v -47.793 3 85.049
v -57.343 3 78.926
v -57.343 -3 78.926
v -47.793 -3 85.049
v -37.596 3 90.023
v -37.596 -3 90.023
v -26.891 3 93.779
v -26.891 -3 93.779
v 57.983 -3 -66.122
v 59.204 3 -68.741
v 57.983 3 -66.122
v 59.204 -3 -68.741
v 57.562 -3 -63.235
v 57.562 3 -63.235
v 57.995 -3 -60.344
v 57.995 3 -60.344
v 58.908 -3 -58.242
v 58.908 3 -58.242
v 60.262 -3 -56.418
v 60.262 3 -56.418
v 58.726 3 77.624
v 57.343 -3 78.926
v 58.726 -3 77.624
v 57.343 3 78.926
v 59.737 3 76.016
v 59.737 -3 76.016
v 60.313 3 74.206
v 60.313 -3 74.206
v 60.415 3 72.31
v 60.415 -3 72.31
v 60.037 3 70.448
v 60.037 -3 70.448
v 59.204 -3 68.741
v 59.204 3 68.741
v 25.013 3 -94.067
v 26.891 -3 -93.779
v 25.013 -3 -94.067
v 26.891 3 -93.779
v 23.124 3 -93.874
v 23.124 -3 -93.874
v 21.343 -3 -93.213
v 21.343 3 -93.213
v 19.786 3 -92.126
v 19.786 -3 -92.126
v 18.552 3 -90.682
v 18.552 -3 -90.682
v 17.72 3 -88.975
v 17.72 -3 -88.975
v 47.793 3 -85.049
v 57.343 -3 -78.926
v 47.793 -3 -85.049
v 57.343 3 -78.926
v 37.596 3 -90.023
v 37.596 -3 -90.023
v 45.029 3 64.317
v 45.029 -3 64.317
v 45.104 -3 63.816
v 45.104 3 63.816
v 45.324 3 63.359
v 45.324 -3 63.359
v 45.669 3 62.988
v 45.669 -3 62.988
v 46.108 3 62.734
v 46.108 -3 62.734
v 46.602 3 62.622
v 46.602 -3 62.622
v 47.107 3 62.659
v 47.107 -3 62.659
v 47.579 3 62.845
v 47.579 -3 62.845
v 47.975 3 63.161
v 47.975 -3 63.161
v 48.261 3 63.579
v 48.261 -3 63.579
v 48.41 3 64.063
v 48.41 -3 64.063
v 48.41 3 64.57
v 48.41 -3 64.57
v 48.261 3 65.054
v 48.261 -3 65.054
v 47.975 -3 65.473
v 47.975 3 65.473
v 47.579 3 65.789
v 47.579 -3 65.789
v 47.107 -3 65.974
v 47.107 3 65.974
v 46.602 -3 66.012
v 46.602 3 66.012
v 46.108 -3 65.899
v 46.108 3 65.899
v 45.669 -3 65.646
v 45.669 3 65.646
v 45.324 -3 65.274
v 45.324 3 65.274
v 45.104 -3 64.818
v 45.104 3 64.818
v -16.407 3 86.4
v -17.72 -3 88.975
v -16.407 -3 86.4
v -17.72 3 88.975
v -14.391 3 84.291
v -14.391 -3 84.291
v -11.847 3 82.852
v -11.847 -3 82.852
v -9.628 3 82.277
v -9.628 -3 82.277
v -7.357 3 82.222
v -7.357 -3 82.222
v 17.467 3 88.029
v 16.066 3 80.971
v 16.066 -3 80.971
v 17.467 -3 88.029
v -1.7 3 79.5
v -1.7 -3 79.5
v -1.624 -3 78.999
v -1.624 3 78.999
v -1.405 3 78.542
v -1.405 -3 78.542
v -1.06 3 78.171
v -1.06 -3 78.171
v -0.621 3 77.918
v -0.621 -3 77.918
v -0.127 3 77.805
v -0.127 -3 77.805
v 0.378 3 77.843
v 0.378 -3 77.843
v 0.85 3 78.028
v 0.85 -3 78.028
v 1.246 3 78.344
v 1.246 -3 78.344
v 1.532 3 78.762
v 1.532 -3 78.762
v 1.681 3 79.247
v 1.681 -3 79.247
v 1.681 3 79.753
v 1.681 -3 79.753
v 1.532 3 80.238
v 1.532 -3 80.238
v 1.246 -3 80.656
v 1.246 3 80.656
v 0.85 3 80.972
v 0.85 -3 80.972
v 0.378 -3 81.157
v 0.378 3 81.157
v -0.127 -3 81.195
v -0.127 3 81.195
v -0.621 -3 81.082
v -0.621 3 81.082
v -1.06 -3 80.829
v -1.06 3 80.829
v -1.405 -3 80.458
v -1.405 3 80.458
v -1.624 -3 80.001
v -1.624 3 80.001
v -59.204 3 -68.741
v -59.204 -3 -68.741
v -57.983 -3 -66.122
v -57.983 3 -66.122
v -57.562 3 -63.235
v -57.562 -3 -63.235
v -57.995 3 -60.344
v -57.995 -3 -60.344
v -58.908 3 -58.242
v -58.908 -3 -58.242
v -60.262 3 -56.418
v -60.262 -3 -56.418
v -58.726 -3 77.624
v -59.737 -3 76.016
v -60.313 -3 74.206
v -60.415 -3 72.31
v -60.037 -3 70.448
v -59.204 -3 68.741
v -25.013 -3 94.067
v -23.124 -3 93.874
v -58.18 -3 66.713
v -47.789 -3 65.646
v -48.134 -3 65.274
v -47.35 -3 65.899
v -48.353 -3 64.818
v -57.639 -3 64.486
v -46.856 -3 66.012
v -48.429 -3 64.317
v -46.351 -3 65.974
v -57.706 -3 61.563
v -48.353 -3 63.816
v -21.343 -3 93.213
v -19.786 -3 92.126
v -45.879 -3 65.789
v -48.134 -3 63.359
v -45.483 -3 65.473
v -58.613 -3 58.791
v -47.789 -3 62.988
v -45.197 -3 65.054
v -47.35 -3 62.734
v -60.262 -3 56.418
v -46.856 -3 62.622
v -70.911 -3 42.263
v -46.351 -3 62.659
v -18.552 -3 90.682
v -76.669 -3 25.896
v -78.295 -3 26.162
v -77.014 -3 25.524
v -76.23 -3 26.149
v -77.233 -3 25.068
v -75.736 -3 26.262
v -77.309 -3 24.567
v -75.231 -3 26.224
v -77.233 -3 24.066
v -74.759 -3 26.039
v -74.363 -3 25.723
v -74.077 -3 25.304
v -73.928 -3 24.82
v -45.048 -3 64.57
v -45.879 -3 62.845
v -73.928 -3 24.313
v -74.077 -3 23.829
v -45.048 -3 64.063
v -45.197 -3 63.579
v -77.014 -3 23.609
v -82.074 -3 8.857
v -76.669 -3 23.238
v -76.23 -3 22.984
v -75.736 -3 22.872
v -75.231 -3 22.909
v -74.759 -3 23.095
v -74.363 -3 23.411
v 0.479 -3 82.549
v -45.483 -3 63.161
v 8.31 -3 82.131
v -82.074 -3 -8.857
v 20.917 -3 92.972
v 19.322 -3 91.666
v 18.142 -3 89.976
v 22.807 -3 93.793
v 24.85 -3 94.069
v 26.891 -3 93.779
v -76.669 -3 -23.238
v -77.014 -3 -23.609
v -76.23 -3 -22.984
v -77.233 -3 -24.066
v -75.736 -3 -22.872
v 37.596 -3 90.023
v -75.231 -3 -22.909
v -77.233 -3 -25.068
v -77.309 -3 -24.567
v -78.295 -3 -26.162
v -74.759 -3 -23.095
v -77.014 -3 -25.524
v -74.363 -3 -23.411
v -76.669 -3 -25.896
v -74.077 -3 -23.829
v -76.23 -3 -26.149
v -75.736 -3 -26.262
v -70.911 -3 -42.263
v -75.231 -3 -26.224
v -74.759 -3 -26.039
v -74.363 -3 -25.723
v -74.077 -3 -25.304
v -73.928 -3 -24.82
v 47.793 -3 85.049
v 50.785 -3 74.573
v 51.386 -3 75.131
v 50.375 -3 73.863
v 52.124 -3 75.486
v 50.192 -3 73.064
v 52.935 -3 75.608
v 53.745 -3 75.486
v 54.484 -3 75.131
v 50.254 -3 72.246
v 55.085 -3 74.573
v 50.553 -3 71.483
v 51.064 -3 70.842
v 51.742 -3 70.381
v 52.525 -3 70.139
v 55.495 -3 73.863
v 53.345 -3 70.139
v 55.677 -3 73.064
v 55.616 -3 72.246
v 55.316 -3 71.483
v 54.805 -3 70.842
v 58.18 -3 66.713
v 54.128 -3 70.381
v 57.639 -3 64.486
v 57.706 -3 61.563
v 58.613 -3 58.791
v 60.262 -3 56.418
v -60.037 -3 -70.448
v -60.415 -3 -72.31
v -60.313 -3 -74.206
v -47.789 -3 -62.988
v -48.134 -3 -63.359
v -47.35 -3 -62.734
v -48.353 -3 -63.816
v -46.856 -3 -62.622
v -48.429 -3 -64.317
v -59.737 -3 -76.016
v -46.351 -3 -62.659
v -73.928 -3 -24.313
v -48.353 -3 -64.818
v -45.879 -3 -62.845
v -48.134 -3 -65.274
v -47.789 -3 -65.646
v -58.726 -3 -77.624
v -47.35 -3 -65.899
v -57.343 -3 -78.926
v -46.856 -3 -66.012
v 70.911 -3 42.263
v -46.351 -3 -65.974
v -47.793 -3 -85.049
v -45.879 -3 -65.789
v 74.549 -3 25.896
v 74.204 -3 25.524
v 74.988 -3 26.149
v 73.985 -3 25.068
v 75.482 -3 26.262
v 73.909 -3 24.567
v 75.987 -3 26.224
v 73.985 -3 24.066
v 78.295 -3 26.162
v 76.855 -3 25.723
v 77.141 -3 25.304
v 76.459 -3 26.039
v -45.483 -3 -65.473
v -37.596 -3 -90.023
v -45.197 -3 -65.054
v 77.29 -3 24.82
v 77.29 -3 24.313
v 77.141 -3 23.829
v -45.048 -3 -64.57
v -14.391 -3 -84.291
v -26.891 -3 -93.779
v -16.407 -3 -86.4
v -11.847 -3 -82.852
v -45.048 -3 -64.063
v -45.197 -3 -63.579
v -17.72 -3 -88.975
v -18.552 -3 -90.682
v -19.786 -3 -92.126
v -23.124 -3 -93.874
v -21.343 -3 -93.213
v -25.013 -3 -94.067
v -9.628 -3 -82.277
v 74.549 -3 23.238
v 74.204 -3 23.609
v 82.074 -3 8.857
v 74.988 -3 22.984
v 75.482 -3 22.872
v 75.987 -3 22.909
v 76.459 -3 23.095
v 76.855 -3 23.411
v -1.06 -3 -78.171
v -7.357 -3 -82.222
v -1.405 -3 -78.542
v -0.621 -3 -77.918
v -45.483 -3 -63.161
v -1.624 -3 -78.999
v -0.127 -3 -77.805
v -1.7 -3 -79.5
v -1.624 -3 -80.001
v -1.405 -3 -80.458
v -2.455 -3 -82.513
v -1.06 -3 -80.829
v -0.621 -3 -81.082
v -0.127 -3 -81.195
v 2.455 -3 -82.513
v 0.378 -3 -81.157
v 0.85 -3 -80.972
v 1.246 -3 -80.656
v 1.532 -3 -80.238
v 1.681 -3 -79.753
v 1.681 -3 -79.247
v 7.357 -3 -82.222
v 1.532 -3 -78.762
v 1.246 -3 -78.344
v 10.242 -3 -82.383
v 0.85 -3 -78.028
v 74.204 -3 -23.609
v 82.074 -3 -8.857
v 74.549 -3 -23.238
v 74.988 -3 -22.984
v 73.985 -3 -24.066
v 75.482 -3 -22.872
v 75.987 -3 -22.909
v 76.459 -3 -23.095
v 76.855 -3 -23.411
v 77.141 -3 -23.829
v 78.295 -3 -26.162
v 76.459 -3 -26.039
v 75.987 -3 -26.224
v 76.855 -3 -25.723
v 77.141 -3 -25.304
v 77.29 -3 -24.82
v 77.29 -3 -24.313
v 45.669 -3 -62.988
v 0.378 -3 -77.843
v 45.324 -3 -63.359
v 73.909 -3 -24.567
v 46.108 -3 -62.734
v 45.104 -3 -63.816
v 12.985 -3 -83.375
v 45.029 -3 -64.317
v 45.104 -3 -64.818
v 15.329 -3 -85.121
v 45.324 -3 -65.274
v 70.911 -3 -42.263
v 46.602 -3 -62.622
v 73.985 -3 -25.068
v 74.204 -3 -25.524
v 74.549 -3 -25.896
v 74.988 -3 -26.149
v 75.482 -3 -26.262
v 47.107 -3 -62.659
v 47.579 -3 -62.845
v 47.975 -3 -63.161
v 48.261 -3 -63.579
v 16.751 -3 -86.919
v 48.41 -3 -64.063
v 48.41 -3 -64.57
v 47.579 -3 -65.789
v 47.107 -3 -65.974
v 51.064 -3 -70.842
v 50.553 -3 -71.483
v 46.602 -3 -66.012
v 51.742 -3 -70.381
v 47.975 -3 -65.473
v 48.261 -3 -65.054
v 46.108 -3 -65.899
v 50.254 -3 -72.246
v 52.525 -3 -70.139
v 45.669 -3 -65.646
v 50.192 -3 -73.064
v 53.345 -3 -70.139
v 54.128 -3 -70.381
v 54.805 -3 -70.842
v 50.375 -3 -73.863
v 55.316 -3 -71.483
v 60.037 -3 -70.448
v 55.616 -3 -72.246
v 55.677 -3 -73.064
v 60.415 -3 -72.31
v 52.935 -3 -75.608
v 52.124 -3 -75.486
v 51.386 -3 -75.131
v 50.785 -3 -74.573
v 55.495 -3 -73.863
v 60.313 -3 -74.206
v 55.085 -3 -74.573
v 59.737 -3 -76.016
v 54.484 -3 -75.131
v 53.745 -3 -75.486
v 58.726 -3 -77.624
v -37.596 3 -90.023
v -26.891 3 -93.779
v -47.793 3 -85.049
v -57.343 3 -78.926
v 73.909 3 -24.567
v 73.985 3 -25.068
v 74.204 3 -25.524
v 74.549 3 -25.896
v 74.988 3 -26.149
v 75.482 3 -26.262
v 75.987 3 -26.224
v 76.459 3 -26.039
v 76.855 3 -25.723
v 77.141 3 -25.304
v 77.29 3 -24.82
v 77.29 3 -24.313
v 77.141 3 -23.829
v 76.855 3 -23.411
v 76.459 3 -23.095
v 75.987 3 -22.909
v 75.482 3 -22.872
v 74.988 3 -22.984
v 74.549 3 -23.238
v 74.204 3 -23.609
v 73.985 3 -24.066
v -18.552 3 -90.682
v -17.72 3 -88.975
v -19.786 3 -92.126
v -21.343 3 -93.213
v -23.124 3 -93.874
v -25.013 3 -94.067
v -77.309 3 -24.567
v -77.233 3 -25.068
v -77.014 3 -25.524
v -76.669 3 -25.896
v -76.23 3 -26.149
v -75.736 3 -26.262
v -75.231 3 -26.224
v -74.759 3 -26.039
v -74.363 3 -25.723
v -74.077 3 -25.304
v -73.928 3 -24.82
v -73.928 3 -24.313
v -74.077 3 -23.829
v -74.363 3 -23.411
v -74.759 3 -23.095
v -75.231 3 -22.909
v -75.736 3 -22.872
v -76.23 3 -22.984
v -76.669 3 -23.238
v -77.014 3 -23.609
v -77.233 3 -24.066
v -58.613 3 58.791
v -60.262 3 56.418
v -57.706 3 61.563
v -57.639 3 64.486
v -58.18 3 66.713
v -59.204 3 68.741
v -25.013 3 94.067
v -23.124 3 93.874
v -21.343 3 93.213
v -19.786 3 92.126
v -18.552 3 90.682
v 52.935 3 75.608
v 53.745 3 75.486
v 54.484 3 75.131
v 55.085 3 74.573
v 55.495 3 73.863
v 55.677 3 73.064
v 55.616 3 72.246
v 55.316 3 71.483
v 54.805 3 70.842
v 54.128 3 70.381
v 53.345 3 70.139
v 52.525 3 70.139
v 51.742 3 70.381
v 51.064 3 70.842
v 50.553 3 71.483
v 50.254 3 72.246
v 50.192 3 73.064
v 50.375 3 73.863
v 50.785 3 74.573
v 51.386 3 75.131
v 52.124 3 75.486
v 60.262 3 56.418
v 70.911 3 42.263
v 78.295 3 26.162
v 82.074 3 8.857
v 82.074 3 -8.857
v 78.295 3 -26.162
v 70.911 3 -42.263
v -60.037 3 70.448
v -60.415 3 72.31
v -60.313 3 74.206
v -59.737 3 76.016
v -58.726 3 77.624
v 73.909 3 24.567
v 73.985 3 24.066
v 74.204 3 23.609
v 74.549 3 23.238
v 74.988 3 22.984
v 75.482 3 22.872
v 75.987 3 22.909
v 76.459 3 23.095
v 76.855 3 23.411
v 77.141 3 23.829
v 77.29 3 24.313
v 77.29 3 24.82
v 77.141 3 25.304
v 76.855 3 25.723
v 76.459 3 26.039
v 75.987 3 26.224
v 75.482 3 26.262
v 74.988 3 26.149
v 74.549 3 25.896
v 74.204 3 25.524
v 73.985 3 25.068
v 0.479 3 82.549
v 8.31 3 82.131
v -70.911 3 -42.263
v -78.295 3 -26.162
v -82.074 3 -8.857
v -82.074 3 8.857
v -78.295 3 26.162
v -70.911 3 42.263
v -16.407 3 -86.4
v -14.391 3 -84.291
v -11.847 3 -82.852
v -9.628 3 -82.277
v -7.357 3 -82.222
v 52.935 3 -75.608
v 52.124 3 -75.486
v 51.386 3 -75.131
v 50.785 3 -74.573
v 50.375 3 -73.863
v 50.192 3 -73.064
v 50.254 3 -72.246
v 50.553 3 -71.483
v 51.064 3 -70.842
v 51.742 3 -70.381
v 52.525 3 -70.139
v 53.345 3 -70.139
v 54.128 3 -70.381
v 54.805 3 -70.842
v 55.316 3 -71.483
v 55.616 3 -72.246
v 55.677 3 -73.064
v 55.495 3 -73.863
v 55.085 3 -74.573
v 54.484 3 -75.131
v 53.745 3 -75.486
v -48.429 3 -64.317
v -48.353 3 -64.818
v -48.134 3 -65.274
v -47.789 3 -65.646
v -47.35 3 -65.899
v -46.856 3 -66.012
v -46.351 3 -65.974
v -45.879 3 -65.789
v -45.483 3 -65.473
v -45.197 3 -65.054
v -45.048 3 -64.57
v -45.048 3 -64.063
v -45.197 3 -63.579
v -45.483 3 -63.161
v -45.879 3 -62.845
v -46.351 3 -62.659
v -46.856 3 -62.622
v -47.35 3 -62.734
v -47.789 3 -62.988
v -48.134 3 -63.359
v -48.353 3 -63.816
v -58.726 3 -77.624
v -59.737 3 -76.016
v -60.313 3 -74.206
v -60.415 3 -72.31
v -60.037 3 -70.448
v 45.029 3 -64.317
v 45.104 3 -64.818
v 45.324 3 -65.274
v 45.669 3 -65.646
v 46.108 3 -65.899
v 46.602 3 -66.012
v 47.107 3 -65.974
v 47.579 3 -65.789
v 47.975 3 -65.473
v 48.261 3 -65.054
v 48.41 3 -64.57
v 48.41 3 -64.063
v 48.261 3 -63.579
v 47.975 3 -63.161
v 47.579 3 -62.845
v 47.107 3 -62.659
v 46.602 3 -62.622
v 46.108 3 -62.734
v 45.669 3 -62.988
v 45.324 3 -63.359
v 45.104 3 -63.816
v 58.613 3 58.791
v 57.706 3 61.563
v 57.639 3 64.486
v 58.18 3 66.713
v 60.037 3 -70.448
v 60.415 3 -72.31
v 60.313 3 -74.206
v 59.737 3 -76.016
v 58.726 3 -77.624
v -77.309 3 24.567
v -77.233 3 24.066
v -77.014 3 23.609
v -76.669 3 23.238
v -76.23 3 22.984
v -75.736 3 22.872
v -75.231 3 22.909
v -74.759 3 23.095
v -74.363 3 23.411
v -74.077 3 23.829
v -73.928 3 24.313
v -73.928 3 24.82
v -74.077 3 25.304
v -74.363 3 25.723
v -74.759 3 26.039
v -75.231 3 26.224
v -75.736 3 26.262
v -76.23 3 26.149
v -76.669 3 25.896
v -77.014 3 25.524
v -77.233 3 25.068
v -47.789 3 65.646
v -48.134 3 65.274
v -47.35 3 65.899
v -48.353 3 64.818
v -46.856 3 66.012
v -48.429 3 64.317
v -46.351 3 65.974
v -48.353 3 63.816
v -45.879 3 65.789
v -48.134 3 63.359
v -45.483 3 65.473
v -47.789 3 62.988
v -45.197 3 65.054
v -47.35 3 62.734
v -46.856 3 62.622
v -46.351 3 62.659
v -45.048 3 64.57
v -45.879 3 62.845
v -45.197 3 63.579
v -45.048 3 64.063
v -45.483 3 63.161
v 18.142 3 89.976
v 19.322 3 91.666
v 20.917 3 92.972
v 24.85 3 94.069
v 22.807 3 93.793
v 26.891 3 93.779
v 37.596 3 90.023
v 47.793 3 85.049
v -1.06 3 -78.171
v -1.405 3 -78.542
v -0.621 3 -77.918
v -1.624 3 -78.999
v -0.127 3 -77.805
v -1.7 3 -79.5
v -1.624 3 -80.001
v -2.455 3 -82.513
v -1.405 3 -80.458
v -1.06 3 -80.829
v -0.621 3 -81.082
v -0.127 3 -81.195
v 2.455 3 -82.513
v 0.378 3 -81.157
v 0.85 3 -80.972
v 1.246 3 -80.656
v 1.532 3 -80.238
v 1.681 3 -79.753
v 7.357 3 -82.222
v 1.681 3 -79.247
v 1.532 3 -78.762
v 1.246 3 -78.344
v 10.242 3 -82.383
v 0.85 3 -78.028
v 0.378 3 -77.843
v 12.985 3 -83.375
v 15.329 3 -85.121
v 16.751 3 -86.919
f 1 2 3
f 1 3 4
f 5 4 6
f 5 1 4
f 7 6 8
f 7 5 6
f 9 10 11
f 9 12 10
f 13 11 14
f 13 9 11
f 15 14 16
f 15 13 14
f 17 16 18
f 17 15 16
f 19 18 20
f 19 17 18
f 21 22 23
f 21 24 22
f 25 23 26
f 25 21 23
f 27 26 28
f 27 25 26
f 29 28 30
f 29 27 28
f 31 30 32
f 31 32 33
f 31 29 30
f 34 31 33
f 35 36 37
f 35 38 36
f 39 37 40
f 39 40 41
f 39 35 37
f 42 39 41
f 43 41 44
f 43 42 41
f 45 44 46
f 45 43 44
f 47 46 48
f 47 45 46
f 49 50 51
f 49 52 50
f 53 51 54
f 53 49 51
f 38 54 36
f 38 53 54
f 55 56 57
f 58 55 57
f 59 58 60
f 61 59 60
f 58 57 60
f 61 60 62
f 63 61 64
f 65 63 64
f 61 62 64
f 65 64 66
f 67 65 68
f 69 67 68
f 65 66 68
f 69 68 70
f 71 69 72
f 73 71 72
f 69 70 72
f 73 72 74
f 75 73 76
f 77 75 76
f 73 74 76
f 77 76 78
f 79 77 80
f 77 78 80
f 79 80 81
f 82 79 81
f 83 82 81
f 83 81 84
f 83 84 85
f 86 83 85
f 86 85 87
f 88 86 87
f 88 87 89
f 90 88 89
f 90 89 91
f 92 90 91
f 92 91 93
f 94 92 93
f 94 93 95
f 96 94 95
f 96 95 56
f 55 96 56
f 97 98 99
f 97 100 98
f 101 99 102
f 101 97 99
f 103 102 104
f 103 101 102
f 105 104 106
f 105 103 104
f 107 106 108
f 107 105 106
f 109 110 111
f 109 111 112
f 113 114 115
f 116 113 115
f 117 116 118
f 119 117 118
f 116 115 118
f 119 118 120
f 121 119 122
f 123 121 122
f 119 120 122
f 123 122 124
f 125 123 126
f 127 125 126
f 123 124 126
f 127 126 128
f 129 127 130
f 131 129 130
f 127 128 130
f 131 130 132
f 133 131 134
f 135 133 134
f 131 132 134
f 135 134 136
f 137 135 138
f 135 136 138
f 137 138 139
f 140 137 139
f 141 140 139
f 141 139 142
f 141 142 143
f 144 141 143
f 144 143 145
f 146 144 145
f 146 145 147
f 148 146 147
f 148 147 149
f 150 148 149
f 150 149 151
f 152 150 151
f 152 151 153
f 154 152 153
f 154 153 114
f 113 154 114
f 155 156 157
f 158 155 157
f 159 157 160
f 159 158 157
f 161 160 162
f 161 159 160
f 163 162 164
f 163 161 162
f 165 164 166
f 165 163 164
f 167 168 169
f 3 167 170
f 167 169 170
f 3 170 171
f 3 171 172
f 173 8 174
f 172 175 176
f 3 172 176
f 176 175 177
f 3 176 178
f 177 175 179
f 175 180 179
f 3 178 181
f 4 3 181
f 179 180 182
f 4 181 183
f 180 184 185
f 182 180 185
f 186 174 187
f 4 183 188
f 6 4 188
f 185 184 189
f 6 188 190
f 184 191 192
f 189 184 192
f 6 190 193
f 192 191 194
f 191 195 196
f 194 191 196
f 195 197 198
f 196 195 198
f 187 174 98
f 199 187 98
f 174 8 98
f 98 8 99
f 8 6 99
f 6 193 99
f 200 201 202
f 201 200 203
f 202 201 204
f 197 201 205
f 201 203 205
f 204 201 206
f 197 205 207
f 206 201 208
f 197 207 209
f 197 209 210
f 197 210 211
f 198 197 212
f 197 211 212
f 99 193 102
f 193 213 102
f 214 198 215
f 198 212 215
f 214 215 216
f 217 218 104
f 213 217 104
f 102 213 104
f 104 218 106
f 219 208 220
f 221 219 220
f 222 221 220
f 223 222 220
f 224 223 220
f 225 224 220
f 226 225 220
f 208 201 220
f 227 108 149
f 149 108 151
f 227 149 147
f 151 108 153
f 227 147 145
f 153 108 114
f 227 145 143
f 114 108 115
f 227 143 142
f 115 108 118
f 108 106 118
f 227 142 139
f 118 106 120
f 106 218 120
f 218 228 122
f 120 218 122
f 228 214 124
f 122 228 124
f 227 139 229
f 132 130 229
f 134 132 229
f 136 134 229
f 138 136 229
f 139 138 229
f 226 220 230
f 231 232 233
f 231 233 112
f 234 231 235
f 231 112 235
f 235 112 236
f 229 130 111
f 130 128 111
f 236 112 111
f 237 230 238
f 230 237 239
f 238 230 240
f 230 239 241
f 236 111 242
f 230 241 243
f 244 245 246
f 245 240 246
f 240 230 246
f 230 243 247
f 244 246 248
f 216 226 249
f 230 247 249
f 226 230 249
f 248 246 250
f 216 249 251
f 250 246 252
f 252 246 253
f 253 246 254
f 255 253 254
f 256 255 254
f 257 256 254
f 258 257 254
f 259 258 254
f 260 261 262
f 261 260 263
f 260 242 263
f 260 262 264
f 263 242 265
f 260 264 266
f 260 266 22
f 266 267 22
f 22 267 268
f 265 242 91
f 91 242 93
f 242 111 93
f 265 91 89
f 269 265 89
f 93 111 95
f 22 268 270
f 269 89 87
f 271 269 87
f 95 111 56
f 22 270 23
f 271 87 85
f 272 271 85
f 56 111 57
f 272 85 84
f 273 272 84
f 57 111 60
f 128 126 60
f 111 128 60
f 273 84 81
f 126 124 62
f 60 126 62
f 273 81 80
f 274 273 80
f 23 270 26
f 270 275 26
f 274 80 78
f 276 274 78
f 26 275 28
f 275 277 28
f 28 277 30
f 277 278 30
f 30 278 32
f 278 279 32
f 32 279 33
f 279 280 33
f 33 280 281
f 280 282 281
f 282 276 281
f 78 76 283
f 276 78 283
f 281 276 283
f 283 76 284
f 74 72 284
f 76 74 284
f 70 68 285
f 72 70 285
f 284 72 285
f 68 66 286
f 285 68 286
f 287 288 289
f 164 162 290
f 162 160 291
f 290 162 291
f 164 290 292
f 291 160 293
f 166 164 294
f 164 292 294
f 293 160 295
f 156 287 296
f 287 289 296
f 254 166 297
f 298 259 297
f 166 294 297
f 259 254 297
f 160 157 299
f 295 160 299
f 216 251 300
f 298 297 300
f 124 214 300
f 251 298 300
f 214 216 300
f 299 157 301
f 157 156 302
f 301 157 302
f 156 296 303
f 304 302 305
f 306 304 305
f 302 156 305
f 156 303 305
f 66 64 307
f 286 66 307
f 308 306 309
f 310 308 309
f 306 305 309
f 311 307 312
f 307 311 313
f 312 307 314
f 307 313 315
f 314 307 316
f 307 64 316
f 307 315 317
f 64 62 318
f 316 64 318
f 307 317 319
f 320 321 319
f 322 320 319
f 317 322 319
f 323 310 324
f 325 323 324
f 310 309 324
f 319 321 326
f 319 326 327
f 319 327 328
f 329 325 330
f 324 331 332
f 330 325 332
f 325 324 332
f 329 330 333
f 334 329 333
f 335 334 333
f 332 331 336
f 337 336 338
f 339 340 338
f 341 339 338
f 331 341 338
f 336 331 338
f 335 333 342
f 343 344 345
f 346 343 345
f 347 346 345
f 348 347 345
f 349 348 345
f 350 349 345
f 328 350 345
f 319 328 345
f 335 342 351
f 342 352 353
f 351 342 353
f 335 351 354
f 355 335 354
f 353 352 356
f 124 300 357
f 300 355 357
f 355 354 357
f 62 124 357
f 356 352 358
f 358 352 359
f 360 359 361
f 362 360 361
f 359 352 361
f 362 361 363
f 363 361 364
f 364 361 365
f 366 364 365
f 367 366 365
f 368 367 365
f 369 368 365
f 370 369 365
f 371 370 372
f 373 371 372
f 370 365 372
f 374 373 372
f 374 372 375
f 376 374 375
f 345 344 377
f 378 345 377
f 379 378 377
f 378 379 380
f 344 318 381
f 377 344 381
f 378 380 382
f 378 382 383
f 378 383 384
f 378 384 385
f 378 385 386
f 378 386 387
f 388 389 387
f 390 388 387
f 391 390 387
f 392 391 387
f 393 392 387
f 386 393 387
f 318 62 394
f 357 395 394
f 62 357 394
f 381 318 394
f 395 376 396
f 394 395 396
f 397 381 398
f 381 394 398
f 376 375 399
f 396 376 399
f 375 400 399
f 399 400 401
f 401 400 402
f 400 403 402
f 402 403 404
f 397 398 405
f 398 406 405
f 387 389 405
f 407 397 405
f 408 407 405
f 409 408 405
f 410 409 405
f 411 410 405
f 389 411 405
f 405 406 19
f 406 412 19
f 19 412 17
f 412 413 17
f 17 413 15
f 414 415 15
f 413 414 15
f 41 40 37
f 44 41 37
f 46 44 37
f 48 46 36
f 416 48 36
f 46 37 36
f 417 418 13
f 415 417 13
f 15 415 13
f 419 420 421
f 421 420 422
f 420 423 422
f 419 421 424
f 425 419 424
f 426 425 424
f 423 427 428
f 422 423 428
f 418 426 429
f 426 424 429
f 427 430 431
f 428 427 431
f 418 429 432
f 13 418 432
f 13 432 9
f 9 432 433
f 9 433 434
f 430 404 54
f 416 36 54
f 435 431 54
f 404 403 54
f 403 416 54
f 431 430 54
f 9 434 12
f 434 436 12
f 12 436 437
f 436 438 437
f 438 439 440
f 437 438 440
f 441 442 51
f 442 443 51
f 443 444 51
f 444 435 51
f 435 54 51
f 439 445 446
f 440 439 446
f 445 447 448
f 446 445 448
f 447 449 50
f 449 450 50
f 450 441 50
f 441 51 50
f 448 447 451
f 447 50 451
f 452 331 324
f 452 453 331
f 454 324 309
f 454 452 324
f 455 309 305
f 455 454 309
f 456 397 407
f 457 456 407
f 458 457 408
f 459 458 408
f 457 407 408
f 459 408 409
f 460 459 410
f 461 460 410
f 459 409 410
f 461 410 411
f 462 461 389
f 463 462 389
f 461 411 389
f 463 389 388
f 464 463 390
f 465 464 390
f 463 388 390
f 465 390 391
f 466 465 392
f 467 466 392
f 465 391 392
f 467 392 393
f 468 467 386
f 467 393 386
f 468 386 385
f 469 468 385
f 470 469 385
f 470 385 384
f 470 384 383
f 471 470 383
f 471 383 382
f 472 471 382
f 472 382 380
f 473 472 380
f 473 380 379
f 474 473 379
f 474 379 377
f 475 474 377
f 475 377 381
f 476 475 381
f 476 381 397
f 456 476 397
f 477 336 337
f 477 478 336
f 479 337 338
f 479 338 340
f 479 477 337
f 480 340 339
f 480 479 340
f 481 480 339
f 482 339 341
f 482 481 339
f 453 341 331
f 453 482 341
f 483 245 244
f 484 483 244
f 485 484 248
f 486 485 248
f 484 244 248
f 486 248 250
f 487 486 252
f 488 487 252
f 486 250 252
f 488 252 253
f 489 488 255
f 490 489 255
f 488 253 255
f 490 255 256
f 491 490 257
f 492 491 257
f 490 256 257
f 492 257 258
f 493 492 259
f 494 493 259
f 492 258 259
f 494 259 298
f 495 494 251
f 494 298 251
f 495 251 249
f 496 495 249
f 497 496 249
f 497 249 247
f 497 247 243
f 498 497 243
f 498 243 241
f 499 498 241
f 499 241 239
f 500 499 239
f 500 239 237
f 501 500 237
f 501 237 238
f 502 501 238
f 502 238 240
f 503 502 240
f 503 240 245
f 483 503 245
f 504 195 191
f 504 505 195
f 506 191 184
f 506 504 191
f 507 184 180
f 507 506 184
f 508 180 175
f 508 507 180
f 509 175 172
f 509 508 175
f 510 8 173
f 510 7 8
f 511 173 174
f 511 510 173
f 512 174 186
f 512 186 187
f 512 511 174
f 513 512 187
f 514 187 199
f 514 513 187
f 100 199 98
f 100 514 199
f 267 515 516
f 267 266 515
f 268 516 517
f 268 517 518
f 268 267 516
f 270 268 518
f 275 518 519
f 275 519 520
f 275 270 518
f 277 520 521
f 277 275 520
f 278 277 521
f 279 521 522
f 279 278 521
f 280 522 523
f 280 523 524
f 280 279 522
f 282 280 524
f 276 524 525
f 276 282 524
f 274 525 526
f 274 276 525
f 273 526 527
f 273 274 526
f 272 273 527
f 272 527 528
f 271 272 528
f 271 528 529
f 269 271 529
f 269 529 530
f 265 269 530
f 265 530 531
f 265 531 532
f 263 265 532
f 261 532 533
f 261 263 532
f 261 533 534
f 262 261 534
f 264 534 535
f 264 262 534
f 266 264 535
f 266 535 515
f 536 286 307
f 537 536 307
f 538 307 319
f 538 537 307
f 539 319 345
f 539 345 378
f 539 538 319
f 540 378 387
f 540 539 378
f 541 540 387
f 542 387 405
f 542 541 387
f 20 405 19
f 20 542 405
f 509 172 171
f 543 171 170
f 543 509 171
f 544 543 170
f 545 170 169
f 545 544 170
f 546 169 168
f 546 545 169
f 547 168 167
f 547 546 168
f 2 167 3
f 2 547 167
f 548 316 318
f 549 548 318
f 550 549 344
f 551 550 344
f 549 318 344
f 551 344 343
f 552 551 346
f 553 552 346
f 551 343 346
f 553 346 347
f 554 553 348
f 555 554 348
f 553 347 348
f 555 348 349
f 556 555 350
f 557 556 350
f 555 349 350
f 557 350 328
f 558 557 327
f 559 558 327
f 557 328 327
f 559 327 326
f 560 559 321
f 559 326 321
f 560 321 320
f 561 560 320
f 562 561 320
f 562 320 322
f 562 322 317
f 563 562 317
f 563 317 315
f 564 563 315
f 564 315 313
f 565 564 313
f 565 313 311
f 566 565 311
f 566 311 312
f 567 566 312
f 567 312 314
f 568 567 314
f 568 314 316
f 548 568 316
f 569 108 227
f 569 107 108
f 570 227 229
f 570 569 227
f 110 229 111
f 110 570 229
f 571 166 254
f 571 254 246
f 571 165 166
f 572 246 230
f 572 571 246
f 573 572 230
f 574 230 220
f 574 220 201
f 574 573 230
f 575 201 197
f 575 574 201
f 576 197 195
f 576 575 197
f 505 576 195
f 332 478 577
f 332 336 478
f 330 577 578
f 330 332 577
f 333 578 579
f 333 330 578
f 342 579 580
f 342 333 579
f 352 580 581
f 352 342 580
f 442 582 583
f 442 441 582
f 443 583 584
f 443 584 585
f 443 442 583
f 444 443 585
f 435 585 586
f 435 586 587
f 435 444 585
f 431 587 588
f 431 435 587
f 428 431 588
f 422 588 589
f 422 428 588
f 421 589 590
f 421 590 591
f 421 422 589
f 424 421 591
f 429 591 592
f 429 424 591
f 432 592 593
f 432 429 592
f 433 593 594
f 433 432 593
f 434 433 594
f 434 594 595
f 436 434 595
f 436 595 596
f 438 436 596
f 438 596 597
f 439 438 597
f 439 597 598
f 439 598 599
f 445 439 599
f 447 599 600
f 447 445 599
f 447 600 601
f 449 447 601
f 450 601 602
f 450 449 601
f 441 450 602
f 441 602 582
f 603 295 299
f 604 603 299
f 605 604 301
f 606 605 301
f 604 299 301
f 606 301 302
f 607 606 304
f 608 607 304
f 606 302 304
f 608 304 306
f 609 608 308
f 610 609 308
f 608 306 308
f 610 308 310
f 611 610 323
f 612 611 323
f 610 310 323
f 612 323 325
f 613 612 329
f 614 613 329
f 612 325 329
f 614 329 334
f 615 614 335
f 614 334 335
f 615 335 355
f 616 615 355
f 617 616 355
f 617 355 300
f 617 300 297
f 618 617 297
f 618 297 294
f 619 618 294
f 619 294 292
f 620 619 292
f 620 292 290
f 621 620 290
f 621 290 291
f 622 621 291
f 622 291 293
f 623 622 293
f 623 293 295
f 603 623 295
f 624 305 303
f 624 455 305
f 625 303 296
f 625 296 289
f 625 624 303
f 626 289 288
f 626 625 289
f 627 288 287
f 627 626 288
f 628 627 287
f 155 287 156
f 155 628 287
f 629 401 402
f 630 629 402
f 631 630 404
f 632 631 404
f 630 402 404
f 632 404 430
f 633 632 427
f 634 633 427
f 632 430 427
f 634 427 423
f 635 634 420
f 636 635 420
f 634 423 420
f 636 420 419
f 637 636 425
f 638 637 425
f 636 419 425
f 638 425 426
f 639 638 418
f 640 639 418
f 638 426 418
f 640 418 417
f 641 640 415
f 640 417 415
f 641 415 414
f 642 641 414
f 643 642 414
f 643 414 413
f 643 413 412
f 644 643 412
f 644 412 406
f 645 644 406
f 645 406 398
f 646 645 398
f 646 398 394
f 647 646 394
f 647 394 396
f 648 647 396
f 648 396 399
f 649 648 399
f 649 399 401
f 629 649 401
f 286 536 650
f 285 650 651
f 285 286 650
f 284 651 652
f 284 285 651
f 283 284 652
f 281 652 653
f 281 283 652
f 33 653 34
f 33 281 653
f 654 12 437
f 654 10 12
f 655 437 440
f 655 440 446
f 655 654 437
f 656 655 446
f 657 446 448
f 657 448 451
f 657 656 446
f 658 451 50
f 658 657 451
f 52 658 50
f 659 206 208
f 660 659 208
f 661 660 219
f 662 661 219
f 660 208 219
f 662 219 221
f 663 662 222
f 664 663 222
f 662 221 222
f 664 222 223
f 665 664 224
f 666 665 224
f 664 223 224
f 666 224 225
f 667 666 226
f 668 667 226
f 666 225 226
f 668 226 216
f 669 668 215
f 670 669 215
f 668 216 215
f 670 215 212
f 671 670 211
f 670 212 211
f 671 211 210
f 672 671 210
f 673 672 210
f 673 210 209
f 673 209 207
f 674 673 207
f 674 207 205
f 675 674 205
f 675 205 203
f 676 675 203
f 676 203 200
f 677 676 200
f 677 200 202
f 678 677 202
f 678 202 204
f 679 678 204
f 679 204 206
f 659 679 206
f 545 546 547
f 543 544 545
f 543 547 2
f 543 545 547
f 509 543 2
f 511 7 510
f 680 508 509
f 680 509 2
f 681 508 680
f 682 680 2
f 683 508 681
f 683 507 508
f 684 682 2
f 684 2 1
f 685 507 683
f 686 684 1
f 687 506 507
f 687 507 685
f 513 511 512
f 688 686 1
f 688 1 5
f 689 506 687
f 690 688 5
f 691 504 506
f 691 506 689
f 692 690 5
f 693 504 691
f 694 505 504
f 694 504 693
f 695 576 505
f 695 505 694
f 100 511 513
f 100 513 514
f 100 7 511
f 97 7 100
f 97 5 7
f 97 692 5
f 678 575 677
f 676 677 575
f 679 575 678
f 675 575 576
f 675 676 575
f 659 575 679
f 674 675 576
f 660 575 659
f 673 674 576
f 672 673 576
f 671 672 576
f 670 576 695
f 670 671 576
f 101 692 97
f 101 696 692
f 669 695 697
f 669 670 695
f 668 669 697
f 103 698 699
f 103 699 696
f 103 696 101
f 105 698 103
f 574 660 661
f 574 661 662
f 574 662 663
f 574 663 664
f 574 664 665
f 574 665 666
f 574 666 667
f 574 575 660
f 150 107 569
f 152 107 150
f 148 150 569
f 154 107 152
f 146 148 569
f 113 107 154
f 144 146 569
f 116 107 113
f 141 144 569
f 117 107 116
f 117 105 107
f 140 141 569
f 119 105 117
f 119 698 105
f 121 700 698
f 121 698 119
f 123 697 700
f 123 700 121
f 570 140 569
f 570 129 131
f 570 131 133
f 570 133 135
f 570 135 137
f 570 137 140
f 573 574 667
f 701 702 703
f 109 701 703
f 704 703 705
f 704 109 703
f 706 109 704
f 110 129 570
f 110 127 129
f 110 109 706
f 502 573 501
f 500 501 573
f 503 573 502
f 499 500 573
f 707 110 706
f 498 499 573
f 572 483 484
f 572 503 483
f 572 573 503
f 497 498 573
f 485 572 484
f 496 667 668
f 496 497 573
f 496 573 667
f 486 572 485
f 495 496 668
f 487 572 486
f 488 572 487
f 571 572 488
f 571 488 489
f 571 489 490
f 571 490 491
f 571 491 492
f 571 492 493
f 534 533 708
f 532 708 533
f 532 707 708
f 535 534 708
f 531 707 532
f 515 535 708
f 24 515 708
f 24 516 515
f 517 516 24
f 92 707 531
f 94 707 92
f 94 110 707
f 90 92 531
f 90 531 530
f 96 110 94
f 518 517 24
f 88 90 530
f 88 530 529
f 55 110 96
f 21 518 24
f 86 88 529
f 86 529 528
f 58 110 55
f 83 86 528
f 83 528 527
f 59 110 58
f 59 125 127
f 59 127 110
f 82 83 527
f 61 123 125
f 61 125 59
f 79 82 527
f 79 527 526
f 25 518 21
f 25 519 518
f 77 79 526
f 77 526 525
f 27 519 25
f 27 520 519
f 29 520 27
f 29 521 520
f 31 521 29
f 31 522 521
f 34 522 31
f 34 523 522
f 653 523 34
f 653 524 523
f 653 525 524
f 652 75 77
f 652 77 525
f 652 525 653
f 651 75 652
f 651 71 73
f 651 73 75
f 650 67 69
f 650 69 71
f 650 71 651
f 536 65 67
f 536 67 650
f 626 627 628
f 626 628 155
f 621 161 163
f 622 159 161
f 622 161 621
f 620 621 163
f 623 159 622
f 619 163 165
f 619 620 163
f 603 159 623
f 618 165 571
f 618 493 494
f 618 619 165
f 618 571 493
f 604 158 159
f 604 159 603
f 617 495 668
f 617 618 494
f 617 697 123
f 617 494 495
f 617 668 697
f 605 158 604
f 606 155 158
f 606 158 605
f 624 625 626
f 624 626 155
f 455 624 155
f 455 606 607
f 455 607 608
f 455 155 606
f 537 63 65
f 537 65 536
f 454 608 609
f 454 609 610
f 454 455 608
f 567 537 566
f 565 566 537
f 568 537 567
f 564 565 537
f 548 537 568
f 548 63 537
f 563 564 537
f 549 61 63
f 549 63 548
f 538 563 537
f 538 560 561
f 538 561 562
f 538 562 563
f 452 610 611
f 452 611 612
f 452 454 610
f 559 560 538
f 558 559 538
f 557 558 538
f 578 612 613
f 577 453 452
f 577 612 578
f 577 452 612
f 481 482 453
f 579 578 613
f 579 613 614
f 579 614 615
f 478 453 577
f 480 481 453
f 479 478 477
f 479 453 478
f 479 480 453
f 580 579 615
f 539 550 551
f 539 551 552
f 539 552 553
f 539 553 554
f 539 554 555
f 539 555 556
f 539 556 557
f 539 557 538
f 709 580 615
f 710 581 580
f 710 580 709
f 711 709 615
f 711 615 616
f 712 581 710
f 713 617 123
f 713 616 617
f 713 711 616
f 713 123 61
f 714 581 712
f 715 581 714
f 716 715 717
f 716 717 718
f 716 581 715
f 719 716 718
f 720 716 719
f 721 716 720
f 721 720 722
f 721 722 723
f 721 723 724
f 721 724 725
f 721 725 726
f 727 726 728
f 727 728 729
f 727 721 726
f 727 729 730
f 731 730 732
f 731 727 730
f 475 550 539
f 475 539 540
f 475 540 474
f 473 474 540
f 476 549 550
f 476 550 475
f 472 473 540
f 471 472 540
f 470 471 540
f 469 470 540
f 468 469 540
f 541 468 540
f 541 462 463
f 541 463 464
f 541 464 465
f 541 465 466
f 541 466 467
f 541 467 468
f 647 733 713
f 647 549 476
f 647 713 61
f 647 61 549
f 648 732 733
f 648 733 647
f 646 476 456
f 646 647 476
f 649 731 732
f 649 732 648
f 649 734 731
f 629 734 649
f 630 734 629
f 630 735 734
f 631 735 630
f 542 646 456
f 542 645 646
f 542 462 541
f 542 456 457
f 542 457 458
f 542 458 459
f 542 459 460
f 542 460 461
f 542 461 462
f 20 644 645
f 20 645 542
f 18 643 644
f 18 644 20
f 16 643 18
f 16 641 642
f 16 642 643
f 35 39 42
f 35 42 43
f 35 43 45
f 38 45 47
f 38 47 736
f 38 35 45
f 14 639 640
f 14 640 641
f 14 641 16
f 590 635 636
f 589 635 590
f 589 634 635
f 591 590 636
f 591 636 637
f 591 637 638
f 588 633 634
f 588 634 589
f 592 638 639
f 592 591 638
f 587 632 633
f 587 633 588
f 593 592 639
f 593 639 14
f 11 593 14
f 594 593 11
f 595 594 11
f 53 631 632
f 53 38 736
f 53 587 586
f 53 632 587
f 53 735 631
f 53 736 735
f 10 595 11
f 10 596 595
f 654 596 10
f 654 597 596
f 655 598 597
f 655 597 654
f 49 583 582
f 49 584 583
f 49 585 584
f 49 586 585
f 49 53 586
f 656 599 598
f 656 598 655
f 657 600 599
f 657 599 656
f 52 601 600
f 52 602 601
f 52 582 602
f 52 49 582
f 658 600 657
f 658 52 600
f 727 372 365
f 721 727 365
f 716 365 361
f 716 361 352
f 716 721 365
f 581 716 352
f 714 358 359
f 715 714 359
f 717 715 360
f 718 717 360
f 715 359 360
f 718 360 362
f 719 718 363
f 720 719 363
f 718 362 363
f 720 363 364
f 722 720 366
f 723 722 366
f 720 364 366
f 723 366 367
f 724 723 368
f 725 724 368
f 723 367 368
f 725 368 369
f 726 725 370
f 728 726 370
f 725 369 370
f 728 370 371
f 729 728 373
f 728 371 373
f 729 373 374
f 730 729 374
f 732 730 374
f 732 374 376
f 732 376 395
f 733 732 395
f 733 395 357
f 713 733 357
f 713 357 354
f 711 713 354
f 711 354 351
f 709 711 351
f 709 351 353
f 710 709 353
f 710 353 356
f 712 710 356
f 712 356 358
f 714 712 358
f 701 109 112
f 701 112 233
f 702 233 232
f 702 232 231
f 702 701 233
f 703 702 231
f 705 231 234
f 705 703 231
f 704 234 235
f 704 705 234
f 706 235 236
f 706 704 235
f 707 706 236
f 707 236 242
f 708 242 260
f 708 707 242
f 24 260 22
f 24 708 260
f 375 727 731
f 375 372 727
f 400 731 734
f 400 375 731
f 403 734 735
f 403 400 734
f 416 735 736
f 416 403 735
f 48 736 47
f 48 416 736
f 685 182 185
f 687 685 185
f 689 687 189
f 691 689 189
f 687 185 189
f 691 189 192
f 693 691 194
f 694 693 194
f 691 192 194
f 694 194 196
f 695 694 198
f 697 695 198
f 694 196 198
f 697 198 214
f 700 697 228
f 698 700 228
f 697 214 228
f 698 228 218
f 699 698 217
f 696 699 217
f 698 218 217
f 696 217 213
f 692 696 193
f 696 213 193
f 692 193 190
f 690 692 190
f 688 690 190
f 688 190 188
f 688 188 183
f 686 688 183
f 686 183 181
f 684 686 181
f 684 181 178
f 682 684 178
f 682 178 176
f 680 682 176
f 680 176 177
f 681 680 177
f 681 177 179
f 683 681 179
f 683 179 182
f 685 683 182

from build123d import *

# Parameters (mm, degrees)
SKETCH1_R            = 2.75
BOSS_EXTRUDE1_DEPTH  = 3
M3_CLEARANCE_HOLE1_D = 3.4
FILLET2_R            = 10


with BuildPart() as part:
    # Sketch1 → Boss-Extrude1 (new, symmetric)
    with BuildSketch(Plane(origin=(0, 0, 0), x_dir=(1, 0, 0), z_dir=(0, 1, 0))):
        with BuildLine():
            Line((-58.614111744, 67.959966353), (-53.914904373, 62.511483636))
            ThreePointArc((-53.914904373, 62.511483636), (-82.55, 0), (-53.914904373, -62.511483636))
            Line((-53.914904373, -62.511483636), (-58.614111744, -67.959966353))
            ThreePointArc((-58.614111744, -67.959966353), (-60.384815089, -73.721869234), (-57.34308106, -78.925980035))
            ThreePointArc((-57.34308106, -78.925980035), (-42.766558206, -87.684438581), (-26.890595122, -93.77864983))
            ThreePointArc((-26.890595122, -93.77864983), (-20.917021387, -92.971598421), (-17.46673379, -88.028883515))
            Line((-17.46673379, -88.028883515), (-16.066391761, -80.971436666))
            ThreePointArc((-16.066391761, -80.971436666), (0, -82.55), (16.066391761, -80.971436666))
            Line((16.066391761, -80.971436666), (17.46673379, -88.028883515))
            ThreePointArc((17.46673379, -88.028883515), (20.917021387, -92.971598421), (26.890595122, -93.77864983))
            ThreePointArc((26.890595122, -93.77864983), (42.766558206, -87.684438581), (57.34308106, -78.925980035))
            ThreePointArc((57.34308106, -78.925980035), (60.384815089, -73.721869234), (58.614111744, -67.959966353))
            Line((58.614111744, -67.959966353), (53.914904373, -62.511483636))
            ThreePointArc((53.914904373, -62.511483636), (82.55, 0), (53.914904373, 62.511483636))
            Line((53.914904373, 62.511483636), (58.614111744, 67.959966353))
            ThreePointArc((58.614111744, 67.959966353), (60.384815089, 73.721869234), (57.34308106, 78.925980035))
            ThreePointArc((57.34308106, 78.925980035), (42.766558206, 87.684438581), (26.890595122, 93.77864983))
            ThreePointArc((26.890595122, 93.77864983), (20.917021387, 92.971598421), (17.46673379, 88.028883515))
            Line((17.46673379, 88.028883515), (16.066391761, 80.971436666))
            ThreePointArc((16.066391761, 80.971436666), (0, 82.55), (-16.066391761, 80.971436666))
            Line((-16.066391761, 80.971436666), (-17.46673379, 88.028883515))
            ThreePointArc((-17.46673379, 88.028883515), (-20.917021387, 92.971598421), (-26.890595122, 93.77864983))
            ThreePointArc((-26.890595122, 93.77864983), (-42.766558206, 87.684438581), (-57.34308106, 78.925980035))
            ThreePointArc((-57.34308106, 78.925980035), (-60.384815089, 73.721869234), (-58.614111744, 67.959966353))
        make_face()
        with Locations(Location((52.934691668, -72.858352577, 0), (0, 0, 270))):
            Circle(SKETCH1_R, mode=Mode.SUBTRACT)
        with Locations(Location((52.934691668, 72.858352577, 0), (0, 0, 90))):
            Circle(SKETCH1_R, mode=Mode.SUBTRACT)
    extrude(amount=BOSS_EXTRUDE1_DEPTH, both=True)

    # M3 Clearance Hole1 (through all)
    with Locations(Plane(origin=(0, 3, 0), x_dir=(1, 0, 0), z_dir=(0, 1, 0))):
        with Locations((0, 79.5), (46.728927557, 64.316851053), (75.608993045, 24.566851053), (75.608993045, -24.566851053), (46.728927557, -64.316851053), (0, -79.5), (-46.728927557, -64.316851053), (-75.608993045, -24.566851053), (-75.608993045, 24.566851053), (-46.728927557, 64.316851053)):
            Hole(M3_CLEARANCE_HOLE1_D / 2)

    # Fillet2
    fillet2_edges = [part.edges().sort_by_distance(p)[0] for p in [
        (-53.914904373, 0, 62.511483636),
        (-53.914904373, 0, -62.511483636),
        (-16.066391761, 0, 80.971436666),
        (53.914904373, 0, 62.511483636),
        (53.914904373, 0, -62.511483636),
        (16.066391761, 0, -80.971436666),
        (-16.066391761, 0, -80.971436666),
    ]]
    fillet(fillet2_edges, radius=FILLET2_R)


solid = part.part
